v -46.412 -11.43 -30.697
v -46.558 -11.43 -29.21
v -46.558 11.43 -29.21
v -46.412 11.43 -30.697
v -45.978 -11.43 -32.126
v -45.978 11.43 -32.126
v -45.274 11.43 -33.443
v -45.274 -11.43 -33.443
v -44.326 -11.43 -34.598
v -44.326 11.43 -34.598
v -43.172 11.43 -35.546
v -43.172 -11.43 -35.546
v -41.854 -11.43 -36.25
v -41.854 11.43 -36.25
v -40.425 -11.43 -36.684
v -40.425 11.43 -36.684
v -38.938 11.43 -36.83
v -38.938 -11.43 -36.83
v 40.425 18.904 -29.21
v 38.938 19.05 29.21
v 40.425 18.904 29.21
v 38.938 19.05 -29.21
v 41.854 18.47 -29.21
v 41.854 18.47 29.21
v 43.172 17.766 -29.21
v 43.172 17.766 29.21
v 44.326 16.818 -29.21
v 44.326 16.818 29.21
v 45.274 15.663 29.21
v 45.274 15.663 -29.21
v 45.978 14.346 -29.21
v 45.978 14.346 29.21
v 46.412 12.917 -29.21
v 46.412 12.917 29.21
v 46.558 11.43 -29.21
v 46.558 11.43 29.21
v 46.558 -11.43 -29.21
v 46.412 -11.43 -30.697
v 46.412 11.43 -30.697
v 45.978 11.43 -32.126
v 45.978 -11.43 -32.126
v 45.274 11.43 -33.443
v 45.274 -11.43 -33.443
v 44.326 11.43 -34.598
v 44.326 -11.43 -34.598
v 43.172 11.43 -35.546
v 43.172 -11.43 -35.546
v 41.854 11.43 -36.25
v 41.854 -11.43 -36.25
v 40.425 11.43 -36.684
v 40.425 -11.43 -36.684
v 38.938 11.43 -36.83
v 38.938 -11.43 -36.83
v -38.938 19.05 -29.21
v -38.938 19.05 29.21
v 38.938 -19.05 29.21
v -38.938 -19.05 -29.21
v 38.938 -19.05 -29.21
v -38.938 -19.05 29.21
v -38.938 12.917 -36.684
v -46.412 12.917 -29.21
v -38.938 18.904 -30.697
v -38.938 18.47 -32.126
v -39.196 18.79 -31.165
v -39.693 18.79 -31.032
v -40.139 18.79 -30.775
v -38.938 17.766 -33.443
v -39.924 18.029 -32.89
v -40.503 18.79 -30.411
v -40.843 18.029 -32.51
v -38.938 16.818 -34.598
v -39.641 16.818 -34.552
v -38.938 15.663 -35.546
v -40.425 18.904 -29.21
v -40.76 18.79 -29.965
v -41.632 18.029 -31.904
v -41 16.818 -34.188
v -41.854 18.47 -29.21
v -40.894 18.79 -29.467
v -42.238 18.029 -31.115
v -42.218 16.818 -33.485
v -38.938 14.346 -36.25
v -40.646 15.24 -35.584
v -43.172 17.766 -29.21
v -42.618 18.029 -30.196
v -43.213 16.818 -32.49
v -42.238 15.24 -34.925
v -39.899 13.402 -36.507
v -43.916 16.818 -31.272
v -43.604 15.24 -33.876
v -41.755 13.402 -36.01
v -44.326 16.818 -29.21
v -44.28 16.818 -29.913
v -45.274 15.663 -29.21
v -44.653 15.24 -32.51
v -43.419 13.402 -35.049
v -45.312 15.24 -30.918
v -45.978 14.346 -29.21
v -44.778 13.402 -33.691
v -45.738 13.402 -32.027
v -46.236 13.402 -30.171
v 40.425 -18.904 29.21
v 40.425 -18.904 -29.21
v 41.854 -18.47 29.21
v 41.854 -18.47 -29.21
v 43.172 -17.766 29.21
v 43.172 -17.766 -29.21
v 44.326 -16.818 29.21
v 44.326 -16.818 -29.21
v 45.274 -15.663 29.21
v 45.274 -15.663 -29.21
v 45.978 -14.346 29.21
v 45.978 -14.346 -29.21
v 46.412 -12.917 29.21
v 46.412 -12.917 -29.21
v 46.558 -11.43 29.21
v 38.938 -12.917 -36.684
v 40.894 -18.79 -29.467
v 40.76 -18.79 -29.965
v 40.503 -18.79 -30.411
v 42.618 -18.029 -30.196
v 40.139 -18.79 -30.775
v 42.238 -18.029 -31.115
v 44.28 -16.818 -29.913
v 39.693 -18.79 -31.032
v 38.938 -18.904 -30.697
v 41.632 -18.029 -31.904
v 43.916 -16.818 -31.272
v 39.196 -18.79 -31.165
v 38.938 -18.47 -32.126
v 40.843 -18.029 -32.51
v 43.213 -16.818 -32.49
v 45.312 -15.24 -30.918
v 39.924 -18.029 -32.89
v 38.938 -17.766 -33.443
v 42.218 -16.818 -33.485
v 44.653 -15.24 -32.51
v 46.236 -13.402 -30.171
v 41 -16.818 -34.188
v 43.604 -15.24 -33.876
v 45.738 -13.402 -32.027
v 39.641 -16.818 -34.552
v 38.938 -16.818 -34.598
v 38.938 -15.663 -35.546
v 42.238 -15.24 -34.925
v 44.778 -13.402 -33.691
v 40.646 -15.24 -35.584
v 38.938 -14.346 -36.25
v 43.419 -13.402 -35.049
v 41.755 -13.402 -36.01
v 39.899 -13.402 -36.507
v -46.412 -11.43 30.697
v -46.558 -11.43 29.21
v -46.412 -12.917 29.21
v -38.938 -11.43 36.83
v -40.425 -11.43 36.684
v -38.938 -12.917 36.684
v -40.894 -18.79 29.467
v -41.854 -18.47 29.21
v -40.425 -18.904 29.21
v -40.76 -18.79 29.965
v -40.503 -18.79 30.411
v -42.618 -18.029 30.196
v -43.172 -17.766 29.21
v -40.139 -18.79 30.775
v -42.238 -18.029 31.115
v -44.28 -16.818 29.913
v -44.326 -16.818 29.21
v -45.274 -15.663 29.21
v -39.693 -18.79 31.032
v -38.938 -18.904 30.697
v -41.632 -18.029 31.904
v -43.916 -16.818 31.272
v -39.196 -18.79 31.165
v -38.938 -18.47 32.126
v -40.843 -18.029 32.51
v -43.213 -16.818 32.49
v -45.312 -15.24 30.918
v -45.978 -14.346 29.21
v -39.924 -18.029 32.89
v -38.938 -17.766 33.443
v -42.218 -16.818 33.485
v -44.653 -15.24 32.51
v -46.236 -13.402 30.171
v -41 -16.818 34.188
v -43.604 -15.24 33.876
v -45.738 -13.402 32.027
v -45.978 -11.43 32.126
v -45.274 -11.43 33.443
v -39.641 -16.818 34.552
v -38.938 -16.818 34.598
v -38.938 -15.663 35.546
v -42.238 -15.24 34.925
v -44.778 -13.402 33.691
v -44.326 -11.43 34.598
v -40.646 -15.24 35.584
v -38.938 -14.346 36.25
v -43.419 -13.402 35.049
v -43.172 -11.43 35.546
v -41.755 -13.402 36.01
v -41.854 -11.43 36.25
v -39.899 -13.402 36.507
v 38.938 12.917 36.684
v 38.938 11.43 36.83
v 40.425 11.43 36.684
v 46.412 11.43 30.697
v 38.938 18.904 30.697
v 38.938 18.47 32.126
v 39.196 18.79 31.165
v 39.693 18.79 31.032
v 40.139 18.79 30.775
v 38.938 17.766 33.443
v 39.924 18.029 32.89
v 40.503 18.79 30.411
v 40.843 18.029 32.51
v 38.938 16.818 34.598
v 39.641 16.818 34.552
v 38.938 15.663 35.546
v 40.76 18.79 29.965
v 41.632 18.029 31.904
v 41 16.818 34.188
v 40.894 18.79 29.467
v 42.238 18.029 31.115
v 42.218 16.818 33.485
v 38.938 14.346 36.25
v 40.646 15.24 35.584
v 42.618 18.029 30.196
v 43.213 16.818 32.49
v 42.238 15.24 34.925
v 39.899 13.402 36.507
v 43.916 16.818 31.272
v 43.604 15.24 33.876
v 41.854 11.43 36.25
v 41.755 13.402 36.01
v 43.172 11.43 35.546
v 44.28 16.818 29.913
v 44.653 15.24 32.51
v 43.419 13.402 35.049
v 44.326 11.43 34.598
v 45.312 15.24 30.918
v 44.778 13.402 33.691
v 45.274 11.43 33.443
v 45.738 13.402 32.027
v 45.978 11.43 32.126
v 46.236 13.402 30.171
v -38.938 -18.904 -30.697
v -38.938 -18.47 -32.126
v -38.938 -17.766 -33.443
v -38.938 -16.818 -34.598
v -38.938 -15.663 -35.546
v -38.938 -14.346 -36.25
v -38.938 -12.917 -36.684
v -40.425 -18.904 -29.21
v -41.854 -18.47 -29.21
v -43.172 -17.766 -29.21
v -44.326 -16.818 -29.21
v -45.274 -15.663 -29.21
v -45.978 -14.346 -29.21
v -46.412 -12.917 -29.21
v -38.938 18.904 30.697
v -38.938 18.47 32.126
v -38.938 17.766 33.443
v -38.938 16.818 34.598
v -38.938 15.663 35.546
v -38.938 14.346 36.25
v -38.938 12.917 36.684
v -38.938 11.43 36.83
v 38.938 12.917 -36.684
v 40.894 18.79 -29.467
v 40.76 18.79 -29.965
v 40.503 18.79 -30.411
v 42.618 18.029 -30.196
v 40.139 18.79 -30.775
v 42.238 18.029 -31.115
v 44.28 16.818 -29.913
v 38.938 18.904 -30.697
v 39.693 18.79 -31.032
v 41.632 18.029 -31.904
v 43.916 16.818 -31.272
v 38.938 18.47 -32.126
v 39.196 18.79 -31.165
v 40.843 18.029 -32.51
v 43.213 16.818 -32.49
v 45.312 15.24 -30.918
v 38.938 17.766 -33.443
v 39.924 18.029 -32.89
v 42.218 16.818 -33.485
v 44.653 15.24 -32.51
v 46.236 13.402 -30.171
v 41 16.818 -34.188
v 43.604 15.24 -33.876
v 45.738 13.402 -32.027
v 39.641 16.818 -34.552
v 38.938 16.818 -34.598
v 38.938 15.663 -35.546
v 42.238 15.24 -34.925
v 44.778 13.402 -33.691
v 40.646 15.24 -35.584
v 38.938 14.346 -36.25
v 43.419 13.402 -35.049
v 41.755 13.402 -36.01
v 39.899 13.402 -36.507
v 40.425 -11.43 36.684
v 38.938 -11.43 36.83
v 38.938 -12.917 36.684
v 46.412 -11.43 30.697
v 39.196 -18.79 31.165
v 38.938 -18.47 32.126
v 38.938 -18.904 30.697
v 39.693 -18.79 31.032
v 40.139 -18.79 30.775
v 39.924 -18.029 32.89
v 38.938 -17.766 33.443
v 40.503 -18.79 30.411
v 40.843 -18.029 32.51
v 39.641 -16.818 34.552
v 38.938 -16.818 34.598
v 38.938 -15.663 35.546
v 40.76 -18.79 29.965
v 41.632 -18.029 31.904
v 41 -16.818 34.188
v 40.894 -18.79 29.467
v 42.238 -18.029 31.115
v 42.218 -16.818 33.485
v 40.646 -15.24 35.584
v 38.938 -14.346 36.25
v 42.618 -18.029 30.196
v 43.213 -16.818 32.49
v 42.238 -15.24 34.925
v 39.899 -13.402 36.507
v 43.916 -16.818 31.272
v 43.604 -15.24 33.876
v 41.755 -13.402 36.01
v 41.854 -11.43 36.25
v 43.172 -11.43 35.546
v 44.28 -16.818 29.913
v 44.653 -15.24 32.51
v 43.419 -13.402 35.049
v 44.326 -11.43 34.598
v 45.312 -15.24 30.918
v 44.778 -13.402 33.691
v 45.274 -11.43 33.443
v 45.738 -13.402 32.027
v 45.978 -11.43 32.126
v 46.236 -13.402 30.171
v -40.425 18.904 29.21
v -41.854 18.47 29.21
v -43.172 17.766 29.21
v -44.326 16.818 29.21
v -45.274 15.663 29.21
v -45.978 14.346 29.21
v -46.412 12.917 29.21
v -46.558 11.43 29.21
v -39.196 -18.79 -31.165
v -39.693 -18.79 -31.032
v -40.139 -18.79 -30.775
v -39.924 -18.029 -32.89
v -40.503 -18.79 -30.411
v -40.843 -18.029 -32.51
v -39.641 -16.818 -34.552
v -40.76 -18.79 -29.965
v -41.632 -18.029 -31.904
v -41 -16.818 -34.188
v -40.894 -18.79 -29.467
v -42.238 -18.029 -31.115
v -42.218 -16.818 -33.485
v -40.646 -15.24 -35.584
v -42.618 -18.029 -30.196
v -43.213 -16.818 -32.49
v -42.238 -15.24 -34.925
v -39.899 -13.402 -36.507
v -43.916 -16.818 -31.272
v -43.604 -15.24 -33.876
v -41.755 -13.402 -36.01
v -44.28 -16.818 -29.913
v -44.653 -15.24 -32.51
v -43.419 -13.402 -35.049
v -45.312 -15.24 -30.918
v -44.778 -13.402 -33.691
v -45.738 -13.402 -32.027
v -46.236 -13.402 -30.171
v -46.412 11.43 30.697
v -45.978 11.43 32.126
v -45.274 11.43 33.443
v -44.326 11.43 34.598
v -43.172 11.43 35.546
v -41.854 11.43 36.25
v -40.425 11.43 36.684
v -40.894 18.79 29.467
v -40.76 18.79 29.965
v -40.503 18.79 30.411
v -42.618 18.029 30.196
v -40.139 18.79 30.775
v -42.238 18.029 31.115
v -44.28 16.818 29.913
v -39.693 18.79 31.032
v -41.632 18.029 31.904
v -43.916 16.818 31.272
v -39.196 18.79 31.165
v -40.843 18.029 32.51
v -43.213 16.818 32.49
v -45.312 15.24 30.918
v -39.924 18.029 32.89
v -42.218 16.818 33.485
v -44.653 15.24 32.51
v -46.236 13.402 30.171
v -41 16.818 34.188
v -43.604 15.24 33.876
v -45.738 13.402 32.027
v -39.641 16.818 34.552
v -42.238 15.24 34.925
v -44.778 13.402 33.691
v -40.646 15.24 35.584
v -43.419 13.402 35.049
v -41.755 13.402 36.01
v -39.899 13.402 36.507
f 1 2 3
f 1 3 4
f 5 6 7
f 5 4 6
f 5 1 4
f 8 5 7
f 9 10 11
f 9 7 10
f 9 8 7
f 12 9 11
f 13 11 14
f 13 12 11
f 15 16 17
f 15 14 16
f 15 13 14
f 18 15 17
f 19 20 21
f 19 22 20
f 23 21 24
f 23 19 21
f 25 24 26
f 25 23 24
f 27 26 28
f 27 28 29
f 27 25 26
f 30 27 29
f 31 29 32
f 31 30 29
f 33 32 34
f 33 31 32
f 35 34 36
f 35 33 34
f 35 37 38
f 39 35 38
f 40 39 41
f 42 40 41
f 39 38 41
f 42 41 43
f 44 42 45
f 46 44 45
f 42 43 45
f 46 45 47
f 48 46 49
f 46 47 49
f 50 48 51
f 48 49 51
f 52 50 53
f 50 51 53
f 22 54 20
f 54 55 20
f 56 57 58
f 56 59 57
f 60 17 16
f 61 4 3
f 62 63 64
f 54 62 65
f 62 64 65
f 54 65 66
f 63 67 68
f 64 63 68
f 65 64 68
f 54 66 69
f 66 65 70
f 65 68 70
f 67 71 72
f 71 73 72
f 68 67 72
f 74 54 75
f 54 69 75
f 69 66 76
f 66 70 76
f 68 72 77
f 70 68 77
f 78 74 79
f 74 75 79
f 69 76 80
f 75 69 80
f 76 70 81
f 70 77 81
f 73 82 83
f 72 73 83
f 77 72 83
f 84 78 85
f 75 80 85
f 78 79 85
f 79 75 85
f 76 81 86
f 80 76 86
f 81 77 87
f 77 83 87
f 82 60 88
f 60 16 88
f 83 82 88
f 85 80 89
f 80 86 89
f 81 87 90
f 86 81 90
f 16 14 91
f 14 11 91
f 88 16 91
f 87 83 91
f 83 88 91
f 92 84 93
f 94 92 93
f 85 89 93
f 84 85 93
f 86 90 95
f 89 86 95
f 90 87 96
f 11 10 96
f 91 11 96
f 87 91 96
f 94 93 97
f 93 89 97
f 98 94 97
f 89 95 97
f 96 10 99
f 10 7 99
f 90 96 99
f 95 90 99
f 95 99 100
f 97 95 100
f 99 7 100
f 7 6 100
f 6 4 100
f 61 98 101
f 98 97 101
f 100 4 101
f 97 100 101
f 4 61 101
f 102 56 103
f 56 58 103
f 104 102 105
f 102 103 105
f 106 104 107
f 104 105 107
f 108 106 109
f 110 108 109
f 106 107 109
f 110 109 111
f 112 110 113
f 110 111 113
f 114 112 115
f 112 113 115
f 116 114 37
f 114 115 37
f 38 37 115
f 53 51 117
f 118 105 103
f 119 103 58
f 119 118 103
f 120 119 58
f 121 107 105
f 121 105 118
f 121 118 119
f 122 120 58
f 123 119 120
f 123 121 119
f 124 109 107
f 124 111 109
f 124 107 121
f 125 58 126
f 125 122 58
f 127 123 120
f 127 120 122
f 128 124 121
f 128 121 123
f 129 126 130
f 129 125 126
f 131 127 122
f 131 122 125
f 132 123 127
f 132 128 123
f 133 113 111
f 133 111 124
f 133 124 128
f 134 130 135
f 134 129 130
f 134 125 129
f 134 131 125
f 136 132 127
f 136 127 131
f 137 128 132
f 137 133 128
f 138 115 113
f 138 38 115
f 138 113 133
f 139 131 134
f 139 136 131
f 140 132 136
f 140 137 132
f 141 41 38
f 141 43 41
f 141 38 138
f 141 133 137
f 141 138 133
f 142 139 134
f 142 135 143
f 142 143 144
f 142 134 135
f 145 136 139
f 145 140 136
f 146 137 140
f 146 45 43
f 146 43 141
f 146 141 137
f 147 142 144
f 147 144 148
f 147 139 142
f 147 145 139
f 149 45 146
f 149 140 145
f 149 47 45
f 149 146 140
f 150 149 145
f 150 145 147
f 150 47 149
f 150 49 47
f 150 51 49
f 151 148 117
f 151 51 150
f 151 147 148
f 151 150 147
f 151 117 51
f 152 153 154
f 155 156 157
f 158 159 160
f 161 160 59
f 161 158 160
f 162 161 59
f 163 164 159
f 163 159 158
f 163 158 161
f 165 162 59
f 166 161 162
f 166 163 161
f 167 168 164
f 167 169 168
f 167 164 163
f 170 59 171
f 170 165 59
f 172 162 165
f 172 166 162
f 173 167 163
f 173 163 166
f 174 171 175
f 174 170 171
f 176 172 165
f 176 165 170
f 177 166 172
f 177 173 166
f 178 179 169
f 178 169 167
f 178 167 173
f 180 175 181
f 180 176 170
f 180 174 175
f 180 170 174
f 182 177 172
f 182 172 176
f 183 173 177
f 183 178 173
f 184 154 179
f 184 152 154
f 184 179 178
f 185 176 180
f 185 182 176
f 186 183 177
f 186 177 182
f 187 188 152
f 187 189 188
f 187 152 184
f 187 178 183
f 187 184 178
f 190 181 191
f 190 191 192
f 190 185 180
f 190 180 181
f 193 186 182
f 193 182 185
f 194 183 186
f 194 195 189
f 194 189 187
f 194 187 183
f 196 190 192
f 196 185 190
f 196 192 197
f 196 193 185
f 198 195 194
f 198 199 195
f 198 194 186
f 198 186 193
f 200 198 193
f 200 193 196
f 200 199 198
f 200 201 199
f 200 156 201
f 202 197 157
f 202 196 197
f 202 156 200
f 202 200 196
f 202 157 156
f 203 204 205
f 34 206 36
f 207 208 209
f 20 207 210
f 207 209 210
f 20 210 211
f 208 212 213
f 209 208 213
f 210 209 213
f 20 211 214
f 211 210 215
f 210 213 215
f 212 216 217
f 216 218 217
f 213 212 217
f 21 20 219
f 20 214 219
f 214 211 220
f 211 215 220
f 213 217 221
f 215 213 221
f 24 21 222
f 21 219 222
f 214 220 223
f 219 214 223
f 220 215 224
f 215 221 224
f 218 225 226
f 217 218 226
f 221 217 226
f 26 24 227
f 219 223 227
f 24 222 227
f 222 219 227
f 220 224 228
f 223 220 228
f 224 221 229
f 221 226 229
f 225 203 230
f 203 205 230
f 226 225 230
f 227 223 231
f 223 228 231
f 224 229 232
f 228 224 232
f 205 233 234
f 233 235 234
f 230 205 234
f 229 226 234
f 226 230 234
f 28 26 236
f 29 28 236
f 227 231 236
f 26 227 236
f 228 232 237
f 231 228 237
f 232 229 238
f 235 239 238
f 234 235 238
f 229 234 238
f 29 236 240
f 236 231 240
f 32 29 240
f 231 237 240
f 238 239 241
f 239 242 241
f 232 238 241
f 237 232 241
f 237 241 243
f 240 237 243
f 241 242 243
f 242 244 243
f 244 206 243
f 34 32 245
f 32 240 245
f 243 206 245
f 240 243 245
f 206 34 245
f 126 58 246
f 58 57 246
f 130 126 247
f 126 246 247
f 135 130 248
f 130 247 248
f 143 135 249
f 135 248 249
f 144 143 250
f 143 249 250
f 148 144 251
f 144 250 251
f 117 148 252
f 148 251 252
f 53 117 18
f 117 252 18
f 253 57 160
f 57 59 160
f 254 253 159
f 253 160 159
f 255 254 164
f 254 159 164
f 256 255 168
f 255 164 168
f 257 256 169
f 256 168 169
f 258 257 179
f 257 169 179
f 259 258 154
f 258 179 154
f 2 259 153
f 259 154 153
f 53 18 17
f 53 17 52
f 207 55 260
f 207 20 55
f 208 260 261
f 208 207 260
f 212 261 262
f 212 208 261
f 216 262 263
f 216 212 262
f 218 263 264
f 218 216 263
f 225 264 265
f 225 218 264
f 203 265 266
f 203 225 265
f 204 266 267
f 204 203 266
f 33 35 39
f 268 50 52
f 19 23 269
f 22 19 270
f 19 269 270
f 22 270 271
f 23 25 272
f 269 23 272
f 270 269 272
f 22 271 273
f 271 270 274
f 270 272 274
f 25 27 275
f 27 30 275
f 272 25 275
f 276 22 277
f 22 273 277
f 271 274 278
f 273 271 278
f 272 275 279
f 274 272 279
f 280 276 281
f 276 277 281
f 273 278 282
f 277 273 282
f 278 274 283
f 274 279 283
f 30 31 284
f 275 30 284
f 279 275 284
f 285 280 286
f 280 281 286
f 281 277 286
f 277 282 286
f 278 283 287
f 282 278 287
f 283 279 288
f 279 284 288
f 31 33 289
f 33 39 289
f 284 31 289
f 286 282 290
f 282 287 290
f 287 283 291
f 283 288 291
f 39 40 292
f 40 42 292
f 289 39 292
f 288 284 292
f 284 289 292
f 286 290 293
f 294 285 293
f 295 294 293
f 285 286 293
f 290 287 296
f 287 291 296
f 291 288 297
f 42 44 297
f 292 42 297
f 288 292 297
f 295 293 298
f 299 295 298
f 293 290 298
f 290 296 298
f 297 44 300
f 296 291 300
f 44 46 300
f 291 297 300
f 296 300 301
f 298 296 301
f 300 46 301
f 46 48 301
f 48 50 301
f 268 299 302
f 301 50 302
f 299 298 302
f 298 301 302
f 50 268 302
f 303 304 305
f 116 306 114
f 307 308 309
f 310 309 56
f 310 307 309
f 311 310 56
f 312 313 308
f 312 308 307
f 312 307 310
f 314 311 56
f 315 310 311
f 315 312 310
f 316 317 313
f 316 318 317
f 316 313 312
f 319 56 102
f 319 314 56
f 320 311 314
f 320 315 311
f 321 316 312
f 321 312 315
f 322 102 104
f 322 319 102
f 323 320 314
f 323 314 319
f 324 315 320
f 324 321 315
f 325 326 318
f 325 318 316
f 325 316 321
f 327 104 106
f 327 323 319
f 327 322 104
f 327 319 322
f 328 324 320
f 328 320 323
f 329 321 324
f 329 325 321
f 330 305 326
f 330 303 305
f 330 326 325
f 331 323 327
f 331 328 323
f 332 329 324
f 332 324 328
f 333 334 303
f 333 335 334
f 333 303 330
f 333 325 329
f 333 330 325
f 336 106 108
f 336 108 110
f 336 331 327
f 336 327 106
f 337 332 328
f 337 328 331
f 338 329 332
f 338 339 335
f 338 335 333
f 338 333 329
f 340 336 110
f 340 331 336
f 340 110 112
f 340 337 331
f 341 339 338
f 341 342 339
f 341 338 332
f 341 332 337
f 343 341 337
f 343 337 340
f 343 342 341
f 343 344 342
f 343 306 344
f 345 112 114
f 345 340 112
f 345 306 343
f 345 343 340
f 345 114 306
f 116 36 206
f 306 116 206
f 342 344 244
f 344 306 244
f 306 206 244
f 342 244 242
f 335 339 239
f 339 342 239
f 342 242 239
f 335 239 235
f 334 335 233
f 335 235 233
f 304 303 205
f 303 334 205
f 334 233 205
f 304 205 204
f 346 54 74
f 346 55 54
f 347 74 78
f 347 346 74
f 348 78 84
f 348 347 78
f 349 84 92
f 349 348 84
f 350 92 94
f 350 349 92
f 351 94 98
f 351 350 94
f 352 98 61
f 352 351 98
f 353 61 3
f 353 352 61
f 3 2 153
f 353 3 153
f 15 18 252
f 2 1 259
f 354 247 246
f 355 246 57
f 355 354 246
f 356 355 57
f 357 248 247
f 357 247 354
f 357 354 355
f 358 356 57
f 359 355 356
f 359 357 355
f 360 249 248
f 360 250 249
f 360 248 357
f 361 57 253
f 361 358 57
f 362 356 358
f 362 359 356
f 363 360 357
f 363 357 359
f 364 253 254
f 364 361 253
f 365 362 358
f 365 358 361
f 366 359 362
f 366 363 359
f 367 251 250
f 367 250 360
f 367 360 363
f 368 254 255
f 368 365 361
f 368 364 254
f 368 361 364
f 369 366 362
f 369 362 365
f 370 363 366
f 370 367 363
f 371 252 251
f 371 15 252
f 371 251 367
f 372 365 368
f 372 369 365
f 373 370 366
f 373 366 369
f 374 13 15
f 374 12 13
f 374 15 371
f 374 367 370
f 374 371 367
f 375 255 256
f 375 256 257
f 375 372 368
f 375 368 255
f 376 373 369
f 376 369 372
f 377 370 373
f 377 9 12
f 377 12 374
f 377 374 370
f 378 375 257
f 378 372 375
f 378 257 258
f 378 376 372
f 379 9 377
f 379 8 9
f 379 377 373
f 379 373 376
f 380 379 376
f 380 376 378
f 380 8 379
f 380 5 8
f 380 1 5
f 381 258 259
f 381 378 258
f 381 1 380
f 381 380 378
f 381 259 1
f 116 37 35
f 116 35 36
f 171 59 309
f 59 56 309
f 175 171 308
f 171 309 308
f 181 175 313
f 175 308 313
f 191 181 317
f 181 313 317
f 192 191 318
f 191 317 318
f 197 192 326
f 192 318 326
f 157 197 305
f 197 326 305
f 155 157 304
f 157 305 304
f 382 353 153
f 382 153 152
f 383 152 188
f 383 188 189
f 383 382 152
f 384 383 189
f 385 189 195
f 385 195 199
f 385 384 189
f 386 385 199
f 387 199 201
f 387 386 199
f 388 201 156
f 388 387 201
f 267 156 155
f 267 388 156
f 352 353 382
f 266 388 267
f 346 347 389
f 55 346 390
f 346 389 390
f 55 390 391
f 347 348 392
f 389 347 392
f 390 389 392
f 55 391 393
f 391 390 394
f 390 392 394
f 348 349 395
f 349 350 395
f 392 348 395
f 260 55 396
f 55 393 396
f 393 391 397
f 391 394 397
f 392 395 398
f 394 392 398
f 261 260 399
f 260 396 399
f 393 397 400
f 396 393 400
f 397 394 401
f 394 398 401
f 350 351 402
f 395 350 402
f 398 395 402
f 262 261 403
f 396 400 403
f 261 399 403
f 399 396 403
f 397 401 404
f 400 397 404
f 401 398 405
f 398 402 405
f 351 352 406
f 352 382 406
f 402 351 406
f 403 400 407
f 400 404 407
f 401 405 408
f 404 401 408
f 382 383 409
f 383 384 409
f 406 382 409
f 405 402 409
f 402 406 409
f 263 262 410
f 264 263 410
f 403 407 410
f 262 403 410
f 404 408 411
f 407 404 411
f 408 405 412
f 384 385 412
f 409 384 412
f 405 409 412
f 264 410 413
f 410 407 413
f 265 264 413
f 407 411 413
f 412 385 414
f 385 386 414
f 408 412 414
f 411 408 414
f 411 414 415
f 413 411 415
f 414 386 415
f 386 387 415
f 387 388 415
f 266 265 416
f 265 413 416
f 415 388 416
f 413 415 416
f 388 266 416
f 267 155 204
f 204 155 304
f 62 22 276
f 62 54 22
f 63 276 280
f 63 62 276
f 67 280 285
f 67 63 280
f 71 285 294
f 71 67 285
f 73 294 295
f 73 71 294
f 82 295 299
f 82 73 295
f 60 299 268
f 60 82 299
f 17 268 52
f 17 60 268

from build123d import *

# Parameters (mm, degrees)
F0_W     = 93.1164
F0_H     = 73.66
F1_DEPTH = 19.05
F2_R     = 7.62
F3_R     = 7.62
F4_R     = 7.62


with BuildPart() as f1:
    # F0 (on Front) → F1 (new body, symmetric)
    with BuildSketch(Plane.XZ):
        Rectangle(F0_W, F0_H)
    extrude(amount=F1_DEPTH, both=True)

    # F2
    f2_edges = [f1.edges().sort_by_distance(p)[0] for p in [
        (-46.5582, 0, -36.83),
        (-46.5582, 0, 36.83),
        (46.5582, 0, -36.83),
        (46.5582, 0, 36.83),
    ]]
    fillet(f2_edges, radius=F2_R)

    # F3
    f3_edges = [f1.edges().sort_by_distance(p)[0] for p in [
        (44.326354, -19.05, -34.598154),
        (0, -19.05, -36.83),
        (46.5582, -19.05, 0),
        (44.326354, -19.05, 34.598154),
        (0, -19.05, 36.83),
        (-44.326354, -19.05, 34.598154),
        (-46.5582, -19.05, 0),
        (-44.326354, -19.05, -34.598154),
    ]]
    fillet(f3_edges, radius=F3_R)

    # F4
    f4_edges = [f1.edges().sort_by_distance(p)[0] for p in [
        (44.326354, 19.05, -34.598154),
        (0, 19.05, -36.83),
        (46.5582, 19.05, 0),
        (-44.326354, 19.05, -34.598154),
        (-46.5582, 19.05, 0),
        (-44.326354, 19.05, 34.598154),
        (0, 19.05, 36.83),
        (44.326354, 19.05, 34.598154),
    ]]
    fillet(f4_edges, radius=F4_R)


solid = f1.part
